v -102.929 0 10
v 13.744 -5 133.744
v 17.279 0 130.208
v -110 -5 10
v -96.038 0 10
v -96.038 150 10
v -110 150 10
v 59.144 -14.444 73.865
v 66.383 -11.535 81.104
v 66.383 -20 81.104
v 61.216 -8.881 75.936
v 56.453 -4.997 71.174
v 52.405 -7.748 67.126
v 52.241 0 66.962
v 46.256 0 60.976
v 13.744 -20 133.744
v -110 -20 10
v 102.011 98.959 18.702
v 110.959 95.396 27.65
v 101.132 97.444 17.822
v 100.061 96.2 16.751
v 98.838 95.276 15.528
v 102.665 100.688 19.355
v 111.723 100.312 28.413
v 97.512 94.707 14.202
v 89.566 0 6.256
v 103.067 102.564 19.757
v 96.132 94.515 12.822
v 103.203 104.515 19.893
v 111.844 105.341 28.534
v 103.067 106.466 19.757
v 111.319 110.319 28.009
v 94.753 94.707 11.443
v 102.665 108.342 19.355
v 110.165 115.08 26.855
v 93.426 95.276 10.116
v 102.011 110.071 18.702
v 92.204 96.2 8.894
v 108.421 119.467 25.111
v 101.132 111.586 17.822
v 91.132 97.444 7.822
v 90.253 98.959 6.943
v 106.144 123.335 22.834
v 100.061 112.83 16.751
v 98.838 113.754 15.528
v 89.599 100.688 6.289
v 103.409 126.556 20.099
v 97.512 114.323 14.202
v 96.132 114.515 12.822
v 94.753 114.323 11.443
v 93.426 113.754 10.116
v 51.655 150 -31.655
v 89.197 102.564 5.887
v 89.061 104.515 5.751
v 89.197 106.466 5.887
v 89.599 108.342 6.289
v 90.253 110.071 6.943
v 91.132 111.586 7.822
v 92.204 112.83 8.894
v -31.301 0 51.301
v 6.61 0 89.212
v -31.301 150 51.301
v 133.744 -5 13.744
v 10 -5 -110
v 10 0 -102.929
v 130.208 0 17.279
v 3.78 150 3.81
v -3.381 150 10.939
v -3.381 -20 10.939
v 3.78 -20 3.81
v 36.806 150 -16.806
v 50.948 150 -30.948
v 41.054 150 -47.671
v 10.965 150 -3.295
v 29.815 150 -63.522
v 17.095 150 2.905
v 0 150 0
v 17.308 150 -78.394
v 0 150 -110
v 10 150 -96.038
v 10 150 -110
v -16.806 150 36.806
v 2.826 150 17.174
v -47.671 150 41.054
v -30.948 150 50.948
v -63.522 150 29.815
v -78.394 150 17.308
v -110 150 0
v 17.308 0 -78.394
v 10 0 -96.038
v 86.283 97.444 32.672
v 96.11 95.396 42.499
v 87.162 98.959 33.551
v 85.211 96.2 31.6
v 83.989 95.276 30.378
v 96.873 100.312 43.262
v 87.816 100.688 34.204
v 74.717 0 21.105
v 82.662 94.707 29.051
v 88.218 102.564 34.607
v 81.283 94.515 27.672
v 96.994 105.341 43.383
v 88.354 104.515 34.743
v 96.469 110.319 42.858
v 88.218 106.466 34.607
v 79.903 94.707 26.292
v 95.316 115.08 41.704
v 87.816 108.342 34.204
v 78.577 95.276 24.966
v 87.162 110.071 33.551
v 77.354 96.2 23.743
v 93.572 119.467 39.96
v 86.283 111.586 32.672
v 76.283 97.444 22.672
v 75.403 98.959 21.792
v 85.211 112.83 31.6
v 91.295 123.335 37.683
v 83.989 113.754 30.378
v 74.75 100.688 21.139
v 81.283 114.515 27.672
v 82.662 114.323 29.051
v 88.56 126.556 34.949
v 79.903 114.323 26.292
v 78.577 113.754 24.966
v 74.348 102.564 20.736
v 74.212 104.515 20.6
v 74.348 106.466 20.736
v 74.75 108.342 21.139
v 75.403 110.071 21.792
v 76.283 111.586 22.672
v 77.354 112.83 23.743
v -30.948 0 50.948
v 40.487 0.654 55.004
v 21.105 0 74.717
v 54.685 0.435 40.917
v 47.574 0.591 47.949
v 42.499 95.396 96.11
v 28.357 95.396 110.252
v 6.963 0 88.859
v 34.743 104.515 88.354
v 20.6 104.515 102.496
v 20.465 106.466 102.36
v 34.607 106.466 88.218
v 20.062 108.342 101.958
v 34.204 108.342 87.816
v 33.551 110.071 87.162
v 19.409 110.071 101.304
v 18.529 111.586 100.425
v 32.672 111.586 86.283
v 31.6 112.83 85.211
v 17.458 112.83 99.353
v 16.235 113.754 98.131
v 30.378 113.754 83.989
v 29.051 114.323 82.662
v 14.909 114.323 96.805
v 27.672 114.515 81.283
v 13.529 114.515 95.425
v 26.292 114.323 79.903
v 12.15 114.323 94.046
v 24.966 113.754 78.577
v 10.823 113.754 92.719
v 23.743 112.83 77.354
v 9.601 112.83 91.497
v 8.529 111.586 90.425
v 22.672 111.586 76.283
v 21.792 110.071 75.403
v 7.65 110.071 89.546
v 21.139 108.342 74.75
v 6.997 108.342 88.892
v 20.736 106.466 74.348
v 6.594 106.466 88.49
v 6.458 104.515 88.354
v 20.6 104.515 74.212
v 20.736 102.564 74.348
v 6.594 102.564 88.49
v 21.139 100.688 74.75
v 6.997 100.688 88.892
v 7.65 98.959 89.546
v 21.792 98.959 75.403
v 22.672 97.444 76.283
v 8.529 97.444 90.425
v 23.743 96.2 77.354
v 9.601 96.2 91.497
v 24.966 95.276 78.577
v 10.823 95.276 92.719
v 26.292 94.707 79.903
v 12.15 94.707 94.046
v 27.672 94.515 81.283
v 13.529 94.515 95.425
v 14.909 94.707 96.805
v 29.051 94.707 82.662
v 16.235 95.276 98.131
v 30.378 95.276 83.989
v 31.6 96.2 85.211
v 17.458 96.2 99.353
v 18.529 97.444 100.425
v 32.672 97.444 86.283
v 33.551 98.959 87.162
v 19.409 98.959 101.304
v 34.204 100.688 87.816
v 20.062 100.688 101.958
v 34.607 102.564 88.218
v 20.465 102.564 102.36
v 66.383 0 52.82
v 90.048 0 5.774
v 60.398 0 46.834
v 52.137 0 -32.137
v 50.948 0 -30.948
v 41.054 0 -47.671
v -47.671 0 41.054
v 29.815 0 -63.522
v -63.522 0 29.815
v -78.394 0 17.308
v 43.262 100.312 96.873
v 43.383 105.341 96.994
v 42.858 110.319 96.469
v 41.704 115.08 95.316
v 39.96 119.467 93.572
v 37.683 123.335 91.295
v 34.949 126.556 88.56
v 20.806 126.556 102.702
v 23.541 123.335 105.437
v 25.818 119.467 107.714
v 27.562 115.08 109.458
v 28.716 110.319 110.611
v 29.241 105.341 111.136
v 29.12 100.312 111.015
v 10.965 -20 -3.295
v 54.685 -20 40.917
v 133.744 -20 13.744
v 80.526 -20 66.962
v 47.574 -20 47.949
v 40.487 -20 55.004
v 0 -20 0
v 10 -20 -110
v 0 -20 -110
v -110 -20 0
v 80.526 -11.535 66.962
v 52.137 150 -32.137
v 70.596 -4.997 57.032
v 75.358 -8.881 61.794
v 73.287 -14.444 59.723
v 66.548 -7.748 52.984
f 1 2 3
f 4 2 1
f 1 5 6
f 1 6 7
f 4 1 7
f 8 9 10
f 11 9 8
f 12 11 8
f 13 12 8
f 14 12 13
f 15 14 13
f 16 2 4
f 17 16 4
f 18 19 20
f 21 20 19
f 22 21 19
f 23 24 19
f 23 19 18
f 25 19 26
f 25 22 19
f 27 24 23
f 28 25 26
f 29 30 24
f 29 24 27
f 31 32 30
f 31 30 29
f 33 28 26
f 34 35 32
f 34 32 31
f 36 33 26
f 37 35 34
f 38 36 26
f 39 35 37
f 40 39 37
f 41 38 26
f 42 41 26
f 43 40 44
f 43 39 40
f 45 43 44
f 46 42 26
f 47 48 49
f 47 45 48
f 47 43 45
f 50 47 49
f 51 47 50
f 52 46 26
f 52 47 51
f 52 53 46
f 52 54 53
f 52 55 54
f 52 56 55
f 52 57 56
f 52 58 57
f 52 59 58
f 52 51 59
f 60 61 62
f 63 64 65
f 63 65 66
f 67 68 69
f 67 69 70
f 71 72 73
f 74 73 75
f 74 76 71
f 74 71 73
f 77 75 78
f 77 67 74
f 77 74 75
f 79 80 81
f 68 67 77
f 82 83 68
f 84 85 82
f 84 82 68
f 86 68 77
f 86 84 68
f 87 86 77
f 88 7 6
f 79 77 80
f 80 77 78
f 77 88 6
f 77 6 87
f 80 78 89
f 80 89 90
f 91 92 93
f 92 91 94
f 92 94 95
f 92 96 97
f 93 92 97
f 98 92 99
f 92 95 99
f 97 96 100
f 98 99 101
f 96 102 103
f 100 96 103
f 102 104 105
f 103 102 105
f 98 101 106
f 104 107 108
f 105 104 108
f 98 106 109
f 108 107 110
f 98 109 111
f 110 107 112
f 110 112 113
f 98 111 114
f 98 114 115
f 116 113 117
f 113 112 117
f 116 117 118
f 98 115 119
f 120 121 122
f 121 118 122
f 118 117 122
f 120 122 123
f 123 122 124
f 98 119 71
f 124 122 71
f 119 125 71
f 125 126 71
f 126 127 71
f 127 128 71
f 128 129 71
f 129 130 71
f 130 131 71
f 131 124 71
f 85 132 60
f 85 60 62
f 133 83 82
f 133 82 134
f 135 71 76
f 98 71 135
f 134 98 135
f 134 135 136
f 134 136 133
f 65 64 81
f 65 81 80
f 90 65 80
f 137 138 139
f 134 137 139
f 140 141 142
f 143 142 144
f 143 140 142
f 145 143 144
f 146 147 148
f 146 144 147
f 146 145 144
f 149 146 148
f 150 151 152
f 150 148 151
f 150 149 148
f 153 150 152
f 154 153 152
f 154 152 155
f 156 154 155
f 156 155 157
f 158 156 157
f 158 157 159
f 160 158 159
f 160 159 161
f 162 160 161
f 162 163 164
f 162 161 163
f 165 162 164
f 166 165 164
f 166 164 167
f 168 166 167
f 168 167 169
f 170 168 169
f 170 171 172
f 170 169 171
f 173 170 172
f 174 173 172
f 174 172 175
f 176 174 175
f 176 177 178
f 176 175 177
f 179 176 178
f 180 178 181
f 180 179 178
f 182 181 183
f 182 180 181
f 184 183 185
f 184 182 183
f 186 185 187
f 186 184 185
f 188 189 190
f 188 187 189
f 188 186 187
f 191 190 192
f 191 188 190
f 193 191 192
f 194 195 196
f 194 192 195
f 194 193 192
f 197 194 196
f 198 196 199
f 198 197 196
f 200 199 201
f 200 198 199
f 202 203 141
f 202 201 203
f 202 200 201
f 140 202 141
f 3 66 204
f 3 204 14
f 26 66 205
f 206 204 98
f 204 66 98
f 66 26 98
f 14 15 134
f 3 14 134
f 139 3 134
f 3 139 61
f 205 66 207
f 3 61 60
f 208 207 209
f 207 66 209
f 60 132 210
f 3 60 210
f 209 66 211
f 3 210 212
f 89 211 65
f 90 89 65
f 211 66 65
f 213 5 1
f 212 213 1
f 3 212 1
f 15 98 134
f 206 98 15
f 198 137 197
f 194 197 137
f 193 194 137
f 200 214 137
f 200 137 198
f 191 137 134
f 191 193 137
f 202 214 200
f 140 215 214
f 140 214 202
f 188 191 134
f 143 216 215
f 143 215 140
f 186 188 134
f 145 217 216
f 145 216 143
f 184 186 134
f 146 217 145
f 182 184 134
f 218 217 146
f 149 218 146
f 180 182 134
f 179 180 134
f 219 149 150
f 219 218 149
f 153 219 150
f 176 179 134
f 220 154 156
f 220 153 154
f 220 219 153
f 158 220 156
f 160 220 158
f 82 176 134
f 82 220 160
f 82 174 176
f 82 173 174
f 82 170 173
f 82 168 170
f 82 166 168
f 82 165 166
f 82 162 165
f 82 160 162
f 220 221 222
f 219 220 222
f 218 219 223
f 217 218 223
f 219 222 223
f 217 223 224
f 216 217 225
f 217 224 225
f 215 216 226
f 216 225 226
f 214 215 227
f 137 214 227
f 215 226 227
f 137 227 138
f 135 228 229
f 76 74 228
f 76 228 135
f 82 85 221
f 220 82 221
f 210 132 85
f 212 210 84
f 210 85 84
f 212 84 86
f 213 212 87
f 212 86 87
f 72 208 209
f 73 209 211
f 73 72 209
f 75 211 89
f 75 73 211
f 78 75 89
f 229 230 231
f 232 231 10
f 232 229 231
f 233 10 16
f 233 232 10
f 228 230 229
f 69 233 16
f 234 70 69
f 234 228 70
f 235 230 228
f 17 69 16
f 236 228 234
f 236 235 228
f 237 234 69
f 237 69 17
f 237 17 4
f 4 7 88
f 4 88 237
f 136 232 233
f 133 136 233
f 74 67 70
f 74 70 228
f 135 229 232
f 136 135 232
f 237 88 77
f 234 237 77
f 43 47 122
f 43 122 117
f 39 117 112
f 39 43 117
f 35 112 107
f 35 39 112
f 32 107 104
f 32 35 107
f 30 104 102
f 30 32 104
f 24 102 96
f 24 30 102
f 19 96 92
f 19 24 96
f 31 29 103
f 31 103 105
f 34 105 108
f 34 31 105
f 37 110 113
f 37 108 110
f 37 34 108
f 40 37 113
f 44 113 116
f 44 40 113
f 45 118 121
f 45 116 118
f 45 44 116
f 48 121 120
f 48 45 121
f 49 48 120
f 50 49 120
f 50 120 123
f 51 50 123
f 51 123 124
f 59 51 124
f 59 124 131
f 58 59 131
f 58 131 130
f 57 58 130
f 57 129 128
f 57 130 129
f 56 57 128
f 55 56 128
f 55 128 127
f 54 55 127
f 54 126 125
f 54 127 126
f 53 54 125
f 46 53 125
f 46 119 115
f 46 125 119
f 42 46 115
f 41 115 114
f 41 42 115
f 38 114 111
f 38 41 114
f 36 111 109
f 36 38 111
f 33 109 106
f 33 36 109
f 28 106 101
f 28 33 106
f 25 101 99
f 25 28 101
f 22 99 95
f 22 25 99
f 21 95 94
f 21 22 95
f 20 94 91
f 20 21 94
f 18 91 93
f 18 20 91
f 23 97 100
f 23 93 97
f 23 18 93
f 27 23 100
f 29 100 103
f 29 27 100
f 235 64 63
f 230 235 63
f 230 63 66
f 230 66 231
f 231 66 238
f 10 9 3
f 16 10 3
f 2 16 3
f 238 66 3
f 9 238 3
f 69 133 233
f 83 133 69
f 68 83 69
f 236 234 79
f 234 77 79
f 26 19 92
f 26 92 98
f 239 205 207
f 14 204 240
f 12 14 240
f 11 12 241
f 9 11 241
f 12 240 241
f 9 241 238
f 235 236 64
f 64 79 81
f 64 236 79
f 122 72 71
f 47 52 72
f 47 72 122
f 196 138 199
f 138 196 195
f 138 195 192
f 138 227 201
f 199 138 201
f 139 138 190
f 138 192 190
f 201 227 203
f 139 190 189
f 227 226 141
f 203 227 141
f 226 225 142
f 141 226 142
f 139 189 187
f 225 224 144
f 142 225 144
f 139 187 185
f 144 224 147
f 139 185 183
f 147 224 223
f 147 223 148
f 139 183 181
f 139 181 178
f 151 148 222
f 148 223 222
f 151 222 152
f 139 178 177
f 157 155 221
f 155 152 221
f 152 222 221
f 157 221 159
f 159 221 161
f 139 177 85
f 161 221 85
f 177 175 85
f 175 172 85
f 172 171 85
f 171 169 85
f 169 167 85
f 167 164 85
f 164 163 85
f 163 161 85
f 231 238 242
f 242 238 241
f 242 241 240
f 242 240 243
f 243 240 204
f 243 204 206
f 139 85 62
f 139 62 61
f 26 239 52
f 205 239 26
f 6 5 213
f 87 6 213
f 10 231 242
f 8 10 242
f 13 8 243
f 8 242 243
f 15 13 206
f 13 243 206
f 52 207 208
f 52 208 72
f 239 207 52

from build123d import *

# Parameters (mm, degrees)
EXTRUDE_1_DEPTH          = 150
EXTRUDE_2_DEPTH          = 150
CUT_EXTRUDE_3_DEPTH      = 161
CHAMFER_4_SIZE           = 10
CHAMFER_5_SIZE           = 10
EXTRUDE_7_DEPTH          = 20
CHAMFER_6_SIZE           = 5
CHAMFER_7_SIZE           = 5
EXTRUDE_8_DEPTH          = 58
EXTRUDE_8_DEPTH_BACK     = 60
EXTRUDE_9_DEPTH          = 20
EXTRUDE_17_DEPTH         = 20
EXTRUDE_17_DEPTH_BACK    = 1
CUT_EXTRUDE_6_DEPTH      = 276.322275262
CUT_EXTRUDE_6_DEPTH_BACK = 276.322275262
SKETCH_13_R              = 10
CUT_EXTRUDE_8_DEPTH      = 10
CUT_EXTRUDE_8_DEPTH_BACK = 10
CUT_EXTRUDE_9_DEPTH      = 31
CUT_EXTRUDE_9_DEPTH_BACK = 182


with BuildPart() as part:
    # 草图1 → 凸台-拉伸1 (new body)
    with BuildSketch(Plane(origin=(0, 0, 0), x_dir=(1, 0, 0), z_dir=(0, 1, 0))):
        Polygon((0, 0), (0, 110), (10, 110), (10, -10), (-110, -10), (-110, 0), align=None)
    extrude(amount=EXTRUDE_1_DEPTH)

    # 草图2 → 凸台-拉伸2 (add)
    with BuildSketch(Plane(origin=(0, 150, 0), x_dir=(1, 0, 0), z_dir=(0, 1, 0))):
        Polygon((10, 86.03773993), (10, -10), (58.018869965, 38.018869965), align=None)
        Polygon((-86.03773993, -10), (10, -10), (-38.018869965, -58.018869965), align=None)
    extrude(amount=-EXTRUDE_2_DEPTH)

    # 草图5 → 切除-拉伸3 (cut)
    with BuildSketch(Plane(origin=(0, 150, 0), x_dir=(1, 0, 0), z_dir=(0, 1, 0))):
        with BuildLine():
            Line((-86.03773993, -10), (-38.018869965, -58.018869965))
            Line((-38.018869965, -58.018869965), (-30.947802153, -50.947802153))
            ThreePointArc((-30.947802153, -50.947802153), (-59.992139056, -32.491105573), (-86.03773993, -10))
        make_face()
        with BuildLine():
            Line((10, 86.03773993), (58.018869965, 38.018869965))
            Line((58.018869965, 38.018869965), (50.947802153, 30.947802153))
            ThreePointArc((50.947802153, 30.947802153), (32.491105573, 59.992139056), (10, 86.03773993))
        make_face()
    extrude(amount=-CUT_EXTRUDE_3_DEPTH, mode=Mode.SUBTRACT)

    # 倒角4
    # the kernel refuses this chamfer: 10 mm, written as the material it adds along each edge
    with BuildSketch(Plane(origin=(-86.03773993, 150, 10), x_dir=(-1, 0, 0), z_dir=(0, -1, 0))) as chamfer_4_piece_1:
        with BuildLine():
            Line((CHAMFER_4_SIZE, 0), (-7.644165176, -7.308452513))
            ThreePointArc((-7.644165176, -7.308452513), (-3.915956427, -3.825991439), (0, 0))
            Line((0, 0), (CHAMFER_4_SIZE, 0))
        make_face()
    extrude(amount=150)

    # 倒角5
    # the kernel refuses this chamfer: 10 mm, written as the material it adds along each edge
    with BuildSketch(Plane(origin=(10, 150, -86.03773993), x_dir=(0.6910568330345163, 0, 0.7228004244024105), z_dir=(0, -1, 0))) as chamfer_5_piece_1:
        with BuildLine():
            Line((10.575761882, 0), (-CHAMFER_5_SIZE * 0.722800424402, -CHAMFER_5_SIZE * 0.691056833035))
            Line((-CHAMFER_5_SIZE * 0.722800424402, -CHAMFER_5_SIZE * 0.691056833035), (0, 0))
            ThreePointArc((0, 0), (5.474432495, -0.059279789), (10.575761882, 0))
        make_face()
    extrude(amount=150)

    # 草图8 → 凸台-拉伸7 (add)
    with BuildSketch(Plane(origin=(0, 0, 0), x_dir=(-1, 0, 0), z_dir=(0, -1, 0))):
        Polygon((110, 0), (0, 0), (0, 110), (-10, 110), (-133.743686708, -13.743686708), (-73.743686708, -73.743686708), (-13.743686708, -133.743686708), (110, -10), align=None)
    extrude(amount=EXTRUDE_7_DEPTH)

    # 倒角6
    chamfer_6_edges = [part.edges().sort_by_distance(p)[0] for p in [
        (-48.128156646, 0, 71.871843354),
    ]]
    chamfer(chamfer_6_edges, length=CHAMFER_6_SIZE)

    # 倒角7
    chamfer_7_edges = [part.edges().sort_by_distance(p)[0] for p in [
        (71.871843354, 0, -48.128156646),
    ]]
    chamfer(chamfer_7_edges, length=CHAMFER_7_SIZE)

    # 草图9 → 凸台-拉伸8 (add, two sides: drawn at the far end of the back side and taken through both)
    with BuildSketch(Plane(origin=(-0.289162235, 0, 0.289162235), x_dir=(0.7071067811865451, 0, 0.70710678118655), z_dir=(-0.70710678118655, 0, 0.7071067811865451)).offset(-EXTRUDE_8_DEPTH_BACK)):
        Polygon((14.142135624, 150), (67.756418231, 0), (14.142135624, 0), align=None)
    extrude(amount=EXTRUDE_8_DEPTH + EXTRUDE_8_DEPTH_BACK)

    # 草图10 → 凸台-拉伸9 (add)
    with BuildSketch(Plane(origin=(-40.947802153, 0, 40.947802153), x_dir=(0.7071067811865452, 0, 0.7071067811865498), z_dir=(-0.7071067811865498, 0, 0.7071067811865452))):
        with BuildLine():
            Line((14.142135624, 150), (87.333768107, 126.556202944))
            ThreePointArc((87.333768107, 126.556202944), (97.811967476, 112.737019173), (98.011481853, 95.395661207))
            Line((98.011481853, 95.395661207), (67.756418231, 0))
            Line((67.756418231, 0), (14.142135624, 150))
        make_face()
    extrude(amount=-EXTRUDE_9_DEPTH)

    # 草图12 → 凸台-拉伸17 (add, two sides: drawn at the far end of the back side and taken through both)
    with BuildSketch(Plane(origin=(40.947802153, 0, -40.947802153), x_dir=(0.7071067811865452, 0, 0.7071067811865498), z_dir=(-0.7071067811865498, 0, 0.7071067811865452)).offset(-EXTRUDE_17_DEPTH_BACK)):
        with BuildLine():
            Line((14.142135624, 150), (87.333768107, 126.556202944))
            ThreePointArc((87.333768107, 126.556202944), (97.811967476, 112.737019173), (98.011481853, 95.395661207))
            Line((98.011481853, 95.395661207), (67.756418231, 0))
            Line((67.756418231, 0), (14.142135624, 150))
        make_face()
    extrude(amount=EXTRUDE_17_DEPTH + EXTRUDE_17_DEPTH_BACK)

    # 草图13 → 切除-拉伸6 (cut, two sides: drawn at the far end of the back side and taken through both)
    with BuildSketch(Plane(origin=(-40.947802153, 0, 40.947802153), x_dir=(0.7071067811865452, 0, 0.7071067811865498), z_dir=(-0.7071067811865498, 0, 0.7071067811865452)).offset(-CUT_EXTRUDE_6_DEPTH_BACK)):
        with Locations((77.042401388, 104.51514855)):
            Circle(SKETCH_13_R)
    extrude(amount=CUT_EXTRUDE_6_DEPTH + CUT_EXTRUDE_6_DEPTH_BACK, mode=Mode.SUBTRACT)

    # 草图15 → 切除-拉伸8 (cut, two sides: drawn at the far end of the back side and taken through both)
    with BuildSketch(Plane(origin=(-0.289162235, 0, 0.289162235), x_dir=(0.7071067811865451, 0, 0.70710678118655), z_dir=(-0.70710678118655, 0, 0.7071067811865451)).offset(-CUT_EXTRUDE_8_DEPTH_BACK)):
        with BuildLine():
            Line((75.824326152, 0), (84.289321881, 0))
            ThreePointArc((84.289321881, 0), (93.528695136, -7.086316984), (104.289321881, -11.535004271))
            Line((104.289321881, -11.535004271), (104.289321881, -20))
            ThreePointArc((104.289321881, -20), (89.190074528, -11.233601025), (75.824326152, 0))
        make_face()
    extrude(amount=CUT_EXTRUDE_8_DEPTH + CUT_EXTRUDE_8_DEPTH_BACK, mode=Mode.SUBTRACT)

    # 草图18 → 切除-拉伸9 (cut, two sides: drawn at the far end of the back side and taken through both)
    with BuildSketch(Plane.XZ.offset(20).offset(-CUT_EXTRUDE_9_DEPTH_BACK)):
        Polygon((40.487345, 55.004008196), (-3.380540201, 10.938796408), (3.780279879, 3.810042897), (10.964971033, -3.294651596), (54.684805363, 40.917454531), (47.574262823, 47.948826004), align=None)
    extrude(amount=CUT_EXTRUDE_9_DEPTH + CUT_EXTRUDE_9_DEPTH_BACK, mode=Mode.SUBTRACT)


solid = part.part
